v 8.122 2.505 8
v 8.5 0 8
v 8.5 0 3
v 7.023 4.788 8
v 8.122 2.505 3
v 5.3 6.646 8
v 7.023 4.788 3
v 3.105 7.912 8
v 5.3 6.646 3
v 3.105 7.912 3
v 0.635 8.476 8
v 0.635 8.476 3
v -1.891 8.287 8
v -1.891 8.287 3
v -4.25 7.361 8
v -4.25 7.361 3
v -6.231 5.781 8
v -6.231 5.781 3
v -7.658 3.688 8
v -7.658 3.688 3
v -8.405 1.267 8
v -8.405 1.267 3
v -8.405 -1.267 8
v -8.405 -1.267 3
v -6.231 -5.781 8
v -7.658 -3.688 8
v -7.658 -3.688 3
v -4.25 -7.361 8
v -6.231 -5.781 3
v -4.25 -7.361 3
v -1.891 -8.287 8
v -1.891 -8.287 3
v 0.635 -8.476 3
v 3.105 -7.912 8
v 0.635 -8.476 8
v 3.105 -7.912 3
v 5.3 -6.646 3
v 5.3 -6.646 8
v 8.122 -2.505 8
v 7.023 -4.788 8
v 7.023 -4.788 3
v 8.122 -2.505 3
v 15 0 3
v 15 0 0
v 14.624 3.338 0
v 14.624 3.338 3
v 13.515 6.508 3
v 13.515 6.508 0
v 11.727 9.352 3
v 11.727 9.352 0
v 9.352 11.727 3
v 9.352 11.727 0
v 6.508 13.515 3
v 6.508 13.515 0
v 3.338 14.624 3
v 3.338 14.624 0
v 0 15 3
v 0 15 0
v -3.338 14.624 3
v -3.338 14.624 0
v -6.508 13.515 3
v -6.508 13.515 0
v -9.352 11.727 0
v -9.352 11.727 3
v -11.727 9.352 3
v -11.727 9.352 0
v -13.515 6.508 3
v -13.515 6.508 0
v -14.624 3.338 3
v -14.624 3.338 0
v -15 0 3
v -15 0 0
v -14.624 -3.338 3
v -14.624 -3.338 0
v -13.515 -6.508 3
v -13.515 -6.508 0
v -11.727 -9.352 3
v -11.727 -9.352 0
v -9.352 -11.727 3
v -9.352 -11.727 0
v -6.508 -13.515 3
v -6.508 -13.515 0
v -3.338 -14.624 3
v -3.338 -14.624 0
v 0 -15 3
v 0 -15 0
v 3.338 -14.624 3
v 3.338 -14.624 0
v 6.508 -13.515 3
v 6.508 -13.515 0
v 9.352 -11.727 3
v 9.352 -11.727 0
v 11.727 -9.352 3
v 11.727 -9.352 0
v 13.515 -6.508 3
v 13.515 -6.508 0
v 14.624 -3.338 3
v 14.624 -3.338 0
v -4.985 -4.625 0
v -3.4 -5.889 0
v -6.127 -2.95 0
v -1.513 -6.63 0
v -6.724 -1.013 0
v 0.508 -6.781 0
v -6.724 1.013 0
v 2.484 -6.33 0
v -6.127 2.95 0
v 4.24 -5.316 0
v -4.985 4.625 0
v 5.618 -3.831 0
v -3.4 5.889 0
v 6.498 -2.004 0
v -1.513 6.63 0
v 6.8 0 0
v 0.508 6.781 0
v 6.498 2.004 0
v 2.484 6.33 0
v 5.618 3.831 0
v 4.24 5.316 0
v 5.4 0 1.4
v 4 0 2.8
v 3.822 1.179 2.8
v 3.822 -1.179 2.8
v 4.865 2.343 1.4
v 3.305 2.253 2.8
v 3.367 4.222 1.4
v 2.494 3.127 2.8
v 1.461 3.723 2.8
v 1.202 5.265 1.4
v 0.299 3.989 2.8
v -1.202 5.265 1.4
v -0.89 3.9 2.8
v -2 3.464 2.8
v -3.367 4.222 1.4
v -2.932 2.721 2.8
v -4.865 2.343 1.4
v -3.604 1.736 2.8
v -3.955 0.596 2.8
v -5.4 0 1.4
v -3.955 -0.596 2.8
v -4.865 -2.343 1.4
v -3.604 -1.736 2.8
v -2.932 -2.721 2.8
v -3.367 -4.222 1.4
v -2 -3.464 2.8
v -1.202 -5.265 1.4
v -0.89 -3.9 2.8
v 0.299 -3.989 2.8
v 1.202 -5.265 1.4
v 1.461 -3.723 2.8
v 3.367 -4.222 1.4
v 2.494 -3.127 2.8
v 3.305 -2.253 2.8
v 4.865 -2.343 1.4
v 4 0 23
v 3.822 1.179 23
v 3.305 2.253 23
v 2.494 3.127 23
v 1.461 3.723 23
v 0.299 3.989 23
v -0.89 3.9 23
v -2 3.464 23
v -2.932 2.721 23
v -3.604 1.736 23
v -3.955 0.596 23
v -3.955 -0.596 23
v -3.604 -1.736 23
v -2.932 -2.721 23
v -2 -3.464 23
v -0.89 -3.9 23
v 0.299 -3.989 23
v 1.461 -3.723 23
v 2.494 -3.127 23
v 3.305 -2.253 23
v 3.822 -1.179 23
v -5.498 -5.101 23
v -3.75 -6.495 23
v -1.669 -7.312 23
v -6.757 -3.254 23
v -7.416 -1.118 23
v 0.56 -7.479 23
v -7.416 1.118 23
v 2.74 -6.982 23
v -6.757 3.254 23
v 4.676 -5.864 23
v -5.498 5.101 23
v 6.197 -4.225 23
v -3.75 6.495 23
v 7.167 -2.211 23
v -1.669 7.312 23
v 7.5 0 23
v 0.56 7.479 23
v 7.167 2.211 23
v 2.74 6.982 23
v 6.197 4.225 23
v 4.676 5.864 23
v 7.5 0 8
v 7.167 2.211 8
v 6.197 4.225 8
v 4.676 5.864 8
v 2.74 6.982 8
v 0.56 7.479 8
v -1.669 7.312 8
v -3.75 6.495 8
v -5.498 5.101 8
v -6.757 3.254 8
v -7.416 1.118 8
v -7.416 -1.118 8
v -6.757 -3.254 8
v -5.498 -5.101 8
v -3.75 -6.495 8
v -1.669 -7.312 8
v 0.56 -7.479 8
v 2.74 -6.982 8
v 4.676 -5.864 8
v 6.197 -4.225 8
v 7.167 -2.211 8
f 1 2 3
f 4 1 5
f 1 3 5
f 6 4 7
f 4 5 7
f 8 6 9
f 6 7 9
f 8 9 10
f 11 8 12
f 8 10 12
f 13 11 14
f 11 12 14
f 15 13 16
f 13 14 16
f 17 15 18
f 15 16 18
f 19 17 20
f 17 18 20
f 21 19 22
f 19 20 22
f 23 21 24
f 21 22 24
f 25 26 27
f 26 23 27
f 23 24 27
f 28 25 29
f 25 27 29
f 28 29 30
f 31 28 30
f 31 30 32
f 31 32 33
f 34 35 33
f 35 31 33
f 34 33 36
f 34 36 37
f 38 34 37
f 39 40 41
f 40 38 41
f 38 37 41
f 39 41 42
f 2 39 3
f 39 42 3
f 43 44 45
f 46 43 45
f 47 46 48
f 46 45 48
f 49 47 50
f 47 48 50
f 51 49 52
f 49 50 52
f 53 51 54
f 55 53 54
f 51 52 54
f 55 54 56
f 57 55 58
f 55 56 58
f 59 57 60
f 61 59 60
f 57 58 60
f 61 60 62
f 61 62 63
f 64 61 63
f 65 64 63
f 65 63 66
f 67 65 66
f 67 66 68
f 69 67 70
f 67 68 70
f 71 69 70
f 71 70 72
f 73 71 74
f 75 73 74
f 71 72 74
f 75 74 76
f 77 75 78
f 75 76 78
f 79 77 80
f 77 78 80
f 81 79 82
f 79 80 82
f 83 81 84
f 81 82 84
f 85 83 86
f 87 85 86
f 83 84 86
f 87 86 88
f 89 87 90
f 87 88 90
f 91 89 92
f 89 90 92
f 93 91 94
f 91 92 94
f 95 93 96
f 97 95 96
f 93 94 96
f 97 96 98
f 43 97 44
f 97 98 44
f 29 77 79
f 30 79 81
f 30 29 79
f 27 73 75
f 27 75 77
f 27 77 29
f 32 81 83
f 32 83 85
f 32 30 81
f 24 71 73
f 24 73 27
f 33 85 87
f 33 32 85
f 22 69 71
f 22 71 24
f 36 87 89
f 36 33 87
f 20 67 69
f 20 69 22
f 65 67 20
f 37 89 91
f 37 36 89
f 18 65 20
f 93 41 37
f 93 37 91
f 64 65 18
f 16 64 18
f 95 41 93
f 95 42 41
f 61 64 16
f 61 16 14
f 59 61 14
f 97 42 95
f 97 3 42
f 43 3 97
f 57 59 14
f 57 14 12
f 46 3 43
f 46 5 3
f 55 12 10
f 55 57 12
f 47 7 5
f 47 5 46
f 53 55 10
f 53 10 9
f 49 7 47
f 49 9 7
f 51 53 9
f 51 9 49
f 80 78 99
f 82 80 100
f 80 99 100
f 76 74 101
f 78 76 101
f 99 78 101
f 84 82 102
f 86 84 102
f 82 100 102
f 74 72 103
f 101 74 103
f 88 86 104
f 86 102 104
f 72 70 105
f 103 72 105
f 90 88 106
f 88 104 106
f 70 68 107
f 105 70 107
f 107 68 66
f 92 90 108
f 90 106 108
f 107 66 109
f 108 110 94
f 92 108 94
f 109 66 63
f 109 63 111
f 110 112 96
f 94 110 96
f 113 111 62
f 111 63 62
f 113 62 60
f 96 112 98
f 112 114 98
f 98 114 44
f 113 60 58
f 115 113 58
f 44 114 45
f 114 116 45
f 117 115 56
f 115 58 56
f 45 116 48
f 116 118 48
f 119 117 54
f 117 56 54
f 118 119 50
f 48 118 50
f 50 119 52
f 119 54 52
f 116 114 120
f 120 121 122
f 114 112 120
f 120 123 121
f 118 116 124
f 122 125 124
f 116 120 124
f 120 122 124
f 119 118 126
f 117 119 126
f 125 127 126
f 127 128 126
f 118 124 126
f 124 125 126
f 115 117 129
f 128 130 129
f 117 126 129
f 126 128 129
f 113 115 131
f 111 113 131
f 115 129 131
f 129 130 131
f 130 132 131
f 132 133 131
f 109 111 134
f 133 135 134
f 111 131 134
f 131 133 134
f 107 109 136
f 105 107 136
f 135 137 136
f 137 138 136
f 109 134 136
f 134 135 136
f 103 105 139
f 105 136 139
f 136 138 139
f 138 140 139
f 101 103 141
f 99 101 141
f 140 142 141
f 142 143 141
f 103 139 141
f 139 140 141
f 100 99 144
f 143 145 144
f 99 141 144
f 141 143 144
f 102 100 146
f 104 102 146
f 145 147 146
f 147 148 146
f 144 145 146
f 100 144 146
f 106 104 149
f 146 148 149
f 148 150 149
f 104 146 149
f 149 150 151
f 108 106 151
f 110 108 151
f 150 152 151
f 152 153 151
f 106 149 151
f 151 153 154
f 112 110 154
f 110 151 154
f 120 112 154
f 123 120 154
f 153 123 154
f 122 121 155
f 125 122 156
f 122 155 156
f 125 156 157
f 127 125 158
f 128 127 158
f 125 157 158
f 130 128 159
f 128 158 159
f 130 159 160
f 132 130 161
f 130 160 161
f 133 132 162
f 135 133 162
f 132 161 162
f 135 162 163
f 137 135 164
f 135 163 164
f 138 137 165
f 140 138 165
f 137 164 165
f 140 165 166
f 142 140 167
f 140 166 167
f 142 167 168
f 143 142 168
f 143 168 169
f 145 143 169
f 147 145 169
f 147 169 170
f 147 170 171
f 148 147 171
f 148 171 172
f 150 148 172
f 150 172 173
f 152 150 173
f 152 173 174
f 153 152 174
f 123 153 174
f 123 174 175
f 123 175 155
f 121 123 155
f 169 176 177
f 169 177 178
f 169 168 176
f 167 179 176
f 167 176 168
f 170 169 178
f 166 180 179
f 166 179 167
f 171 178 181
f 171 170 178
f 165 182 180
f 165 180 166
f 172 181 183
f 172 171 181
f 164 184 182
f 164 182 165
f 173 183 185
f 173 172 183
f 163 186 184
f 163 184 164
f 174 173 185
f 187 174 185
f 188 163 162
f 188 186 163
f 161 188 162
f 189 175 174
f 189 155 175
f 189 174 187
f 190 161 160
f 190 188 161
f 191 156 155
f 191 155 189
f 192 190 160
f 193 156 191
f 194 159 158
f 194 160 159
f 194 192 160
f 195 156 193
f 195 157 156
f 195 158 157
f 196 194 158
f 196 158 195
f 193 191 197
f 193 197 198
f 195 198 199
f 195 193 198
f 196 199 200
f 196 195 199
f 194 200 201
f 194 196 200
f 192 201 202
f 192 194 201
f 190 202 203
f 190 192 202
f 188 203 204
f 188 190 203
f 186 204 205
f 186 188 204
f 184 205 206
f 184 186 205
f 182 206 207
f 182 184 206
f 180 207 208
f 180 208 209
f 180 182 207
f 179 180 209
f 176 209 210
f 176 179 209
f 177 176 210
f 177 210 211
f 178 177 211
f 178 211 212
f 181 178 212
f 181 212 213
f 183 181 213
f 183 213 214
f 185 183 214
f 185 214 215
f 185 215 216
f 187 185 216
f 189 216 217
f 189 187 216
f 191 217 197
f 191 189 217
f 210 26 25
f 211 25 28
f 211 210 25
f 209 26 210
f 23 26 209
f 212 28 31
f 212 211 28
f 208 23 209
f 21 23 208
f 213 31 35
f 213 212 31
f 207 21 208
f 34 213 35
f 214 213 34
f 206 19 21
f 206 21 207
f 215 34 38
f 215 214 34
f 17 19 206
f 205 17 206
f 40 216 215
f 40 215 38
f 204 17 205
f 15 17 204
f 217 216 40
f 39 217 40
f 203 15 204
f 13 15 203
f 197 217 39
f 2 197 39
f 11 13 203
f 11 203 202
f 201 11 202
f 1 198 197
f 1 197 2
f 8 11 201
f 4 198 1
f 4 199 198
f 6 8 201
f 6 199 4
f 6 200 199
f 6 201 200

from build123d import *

# Parameters (mm, degrees)
SKETCH_1_R          = 15
EXTRUDE_1_DEPTH     = 3
SKETCH_2_R          = 8.5
EXTRUDE_2_DEPTH     = 20
SKETCH_3_R          = 10.332882869
SKETCH_3_R_2        = 7.5
CUT_EXTRUDE_1_DEPTH = 15
SKETCH_4_R          = 4
CUT_EXTRUDE_2_DEPTH = 37
CHAMFER_1_SIZE      = 2.8


with BuildPart() as part:
    # Эскиз1 → Бобышка-Вытянуть1 (new body)
    with BuildSketch(Plane.XY):
        Circle(SKETCH_1_R)
    extrude(amount=EXTRUDE_1_DEPTH)

    # Эскиз2 → Бобышка-Вытянуть2 (add)
    with BuildSketch(Plane.XY.offset(3)):
        Circle(SKETCH_2_R)
    extrude(amount=EXTRUDE_2_DEPTH)

    # Эскиз3 → Вырез-Вытянуть1 (cut)
    with BuildSketch(Plane.XY.offset(23)):
        Circle(SKETCH_3_R)
        Circle(SKETCH_3_R_2, mode=Mode.SUBTRACT)
    extrude(amount=-CUT_EXTRUDE_1_DEPTH, mode=Mode.SUBTRACT)

    # Эскиз4 → Вырез-Вытянуть2 (cut)
    with BuildSketch(Plane.XY.offset(23)):
        Circle(SKETCH_4_R)
    extrude(amount=-CUT_EXTRUDE_2_DEPTH, mode=Mode.SUBTRACT)

    # Фаска1
    chamfer_1_edges = [part.edges().sort_by_distance(p)[0] for p in [
        (-4, 0, 0),
    ]]
    chamfer(chamfer_1_edges, length=CHAMFER_1_SIZE)


solid = part.part
